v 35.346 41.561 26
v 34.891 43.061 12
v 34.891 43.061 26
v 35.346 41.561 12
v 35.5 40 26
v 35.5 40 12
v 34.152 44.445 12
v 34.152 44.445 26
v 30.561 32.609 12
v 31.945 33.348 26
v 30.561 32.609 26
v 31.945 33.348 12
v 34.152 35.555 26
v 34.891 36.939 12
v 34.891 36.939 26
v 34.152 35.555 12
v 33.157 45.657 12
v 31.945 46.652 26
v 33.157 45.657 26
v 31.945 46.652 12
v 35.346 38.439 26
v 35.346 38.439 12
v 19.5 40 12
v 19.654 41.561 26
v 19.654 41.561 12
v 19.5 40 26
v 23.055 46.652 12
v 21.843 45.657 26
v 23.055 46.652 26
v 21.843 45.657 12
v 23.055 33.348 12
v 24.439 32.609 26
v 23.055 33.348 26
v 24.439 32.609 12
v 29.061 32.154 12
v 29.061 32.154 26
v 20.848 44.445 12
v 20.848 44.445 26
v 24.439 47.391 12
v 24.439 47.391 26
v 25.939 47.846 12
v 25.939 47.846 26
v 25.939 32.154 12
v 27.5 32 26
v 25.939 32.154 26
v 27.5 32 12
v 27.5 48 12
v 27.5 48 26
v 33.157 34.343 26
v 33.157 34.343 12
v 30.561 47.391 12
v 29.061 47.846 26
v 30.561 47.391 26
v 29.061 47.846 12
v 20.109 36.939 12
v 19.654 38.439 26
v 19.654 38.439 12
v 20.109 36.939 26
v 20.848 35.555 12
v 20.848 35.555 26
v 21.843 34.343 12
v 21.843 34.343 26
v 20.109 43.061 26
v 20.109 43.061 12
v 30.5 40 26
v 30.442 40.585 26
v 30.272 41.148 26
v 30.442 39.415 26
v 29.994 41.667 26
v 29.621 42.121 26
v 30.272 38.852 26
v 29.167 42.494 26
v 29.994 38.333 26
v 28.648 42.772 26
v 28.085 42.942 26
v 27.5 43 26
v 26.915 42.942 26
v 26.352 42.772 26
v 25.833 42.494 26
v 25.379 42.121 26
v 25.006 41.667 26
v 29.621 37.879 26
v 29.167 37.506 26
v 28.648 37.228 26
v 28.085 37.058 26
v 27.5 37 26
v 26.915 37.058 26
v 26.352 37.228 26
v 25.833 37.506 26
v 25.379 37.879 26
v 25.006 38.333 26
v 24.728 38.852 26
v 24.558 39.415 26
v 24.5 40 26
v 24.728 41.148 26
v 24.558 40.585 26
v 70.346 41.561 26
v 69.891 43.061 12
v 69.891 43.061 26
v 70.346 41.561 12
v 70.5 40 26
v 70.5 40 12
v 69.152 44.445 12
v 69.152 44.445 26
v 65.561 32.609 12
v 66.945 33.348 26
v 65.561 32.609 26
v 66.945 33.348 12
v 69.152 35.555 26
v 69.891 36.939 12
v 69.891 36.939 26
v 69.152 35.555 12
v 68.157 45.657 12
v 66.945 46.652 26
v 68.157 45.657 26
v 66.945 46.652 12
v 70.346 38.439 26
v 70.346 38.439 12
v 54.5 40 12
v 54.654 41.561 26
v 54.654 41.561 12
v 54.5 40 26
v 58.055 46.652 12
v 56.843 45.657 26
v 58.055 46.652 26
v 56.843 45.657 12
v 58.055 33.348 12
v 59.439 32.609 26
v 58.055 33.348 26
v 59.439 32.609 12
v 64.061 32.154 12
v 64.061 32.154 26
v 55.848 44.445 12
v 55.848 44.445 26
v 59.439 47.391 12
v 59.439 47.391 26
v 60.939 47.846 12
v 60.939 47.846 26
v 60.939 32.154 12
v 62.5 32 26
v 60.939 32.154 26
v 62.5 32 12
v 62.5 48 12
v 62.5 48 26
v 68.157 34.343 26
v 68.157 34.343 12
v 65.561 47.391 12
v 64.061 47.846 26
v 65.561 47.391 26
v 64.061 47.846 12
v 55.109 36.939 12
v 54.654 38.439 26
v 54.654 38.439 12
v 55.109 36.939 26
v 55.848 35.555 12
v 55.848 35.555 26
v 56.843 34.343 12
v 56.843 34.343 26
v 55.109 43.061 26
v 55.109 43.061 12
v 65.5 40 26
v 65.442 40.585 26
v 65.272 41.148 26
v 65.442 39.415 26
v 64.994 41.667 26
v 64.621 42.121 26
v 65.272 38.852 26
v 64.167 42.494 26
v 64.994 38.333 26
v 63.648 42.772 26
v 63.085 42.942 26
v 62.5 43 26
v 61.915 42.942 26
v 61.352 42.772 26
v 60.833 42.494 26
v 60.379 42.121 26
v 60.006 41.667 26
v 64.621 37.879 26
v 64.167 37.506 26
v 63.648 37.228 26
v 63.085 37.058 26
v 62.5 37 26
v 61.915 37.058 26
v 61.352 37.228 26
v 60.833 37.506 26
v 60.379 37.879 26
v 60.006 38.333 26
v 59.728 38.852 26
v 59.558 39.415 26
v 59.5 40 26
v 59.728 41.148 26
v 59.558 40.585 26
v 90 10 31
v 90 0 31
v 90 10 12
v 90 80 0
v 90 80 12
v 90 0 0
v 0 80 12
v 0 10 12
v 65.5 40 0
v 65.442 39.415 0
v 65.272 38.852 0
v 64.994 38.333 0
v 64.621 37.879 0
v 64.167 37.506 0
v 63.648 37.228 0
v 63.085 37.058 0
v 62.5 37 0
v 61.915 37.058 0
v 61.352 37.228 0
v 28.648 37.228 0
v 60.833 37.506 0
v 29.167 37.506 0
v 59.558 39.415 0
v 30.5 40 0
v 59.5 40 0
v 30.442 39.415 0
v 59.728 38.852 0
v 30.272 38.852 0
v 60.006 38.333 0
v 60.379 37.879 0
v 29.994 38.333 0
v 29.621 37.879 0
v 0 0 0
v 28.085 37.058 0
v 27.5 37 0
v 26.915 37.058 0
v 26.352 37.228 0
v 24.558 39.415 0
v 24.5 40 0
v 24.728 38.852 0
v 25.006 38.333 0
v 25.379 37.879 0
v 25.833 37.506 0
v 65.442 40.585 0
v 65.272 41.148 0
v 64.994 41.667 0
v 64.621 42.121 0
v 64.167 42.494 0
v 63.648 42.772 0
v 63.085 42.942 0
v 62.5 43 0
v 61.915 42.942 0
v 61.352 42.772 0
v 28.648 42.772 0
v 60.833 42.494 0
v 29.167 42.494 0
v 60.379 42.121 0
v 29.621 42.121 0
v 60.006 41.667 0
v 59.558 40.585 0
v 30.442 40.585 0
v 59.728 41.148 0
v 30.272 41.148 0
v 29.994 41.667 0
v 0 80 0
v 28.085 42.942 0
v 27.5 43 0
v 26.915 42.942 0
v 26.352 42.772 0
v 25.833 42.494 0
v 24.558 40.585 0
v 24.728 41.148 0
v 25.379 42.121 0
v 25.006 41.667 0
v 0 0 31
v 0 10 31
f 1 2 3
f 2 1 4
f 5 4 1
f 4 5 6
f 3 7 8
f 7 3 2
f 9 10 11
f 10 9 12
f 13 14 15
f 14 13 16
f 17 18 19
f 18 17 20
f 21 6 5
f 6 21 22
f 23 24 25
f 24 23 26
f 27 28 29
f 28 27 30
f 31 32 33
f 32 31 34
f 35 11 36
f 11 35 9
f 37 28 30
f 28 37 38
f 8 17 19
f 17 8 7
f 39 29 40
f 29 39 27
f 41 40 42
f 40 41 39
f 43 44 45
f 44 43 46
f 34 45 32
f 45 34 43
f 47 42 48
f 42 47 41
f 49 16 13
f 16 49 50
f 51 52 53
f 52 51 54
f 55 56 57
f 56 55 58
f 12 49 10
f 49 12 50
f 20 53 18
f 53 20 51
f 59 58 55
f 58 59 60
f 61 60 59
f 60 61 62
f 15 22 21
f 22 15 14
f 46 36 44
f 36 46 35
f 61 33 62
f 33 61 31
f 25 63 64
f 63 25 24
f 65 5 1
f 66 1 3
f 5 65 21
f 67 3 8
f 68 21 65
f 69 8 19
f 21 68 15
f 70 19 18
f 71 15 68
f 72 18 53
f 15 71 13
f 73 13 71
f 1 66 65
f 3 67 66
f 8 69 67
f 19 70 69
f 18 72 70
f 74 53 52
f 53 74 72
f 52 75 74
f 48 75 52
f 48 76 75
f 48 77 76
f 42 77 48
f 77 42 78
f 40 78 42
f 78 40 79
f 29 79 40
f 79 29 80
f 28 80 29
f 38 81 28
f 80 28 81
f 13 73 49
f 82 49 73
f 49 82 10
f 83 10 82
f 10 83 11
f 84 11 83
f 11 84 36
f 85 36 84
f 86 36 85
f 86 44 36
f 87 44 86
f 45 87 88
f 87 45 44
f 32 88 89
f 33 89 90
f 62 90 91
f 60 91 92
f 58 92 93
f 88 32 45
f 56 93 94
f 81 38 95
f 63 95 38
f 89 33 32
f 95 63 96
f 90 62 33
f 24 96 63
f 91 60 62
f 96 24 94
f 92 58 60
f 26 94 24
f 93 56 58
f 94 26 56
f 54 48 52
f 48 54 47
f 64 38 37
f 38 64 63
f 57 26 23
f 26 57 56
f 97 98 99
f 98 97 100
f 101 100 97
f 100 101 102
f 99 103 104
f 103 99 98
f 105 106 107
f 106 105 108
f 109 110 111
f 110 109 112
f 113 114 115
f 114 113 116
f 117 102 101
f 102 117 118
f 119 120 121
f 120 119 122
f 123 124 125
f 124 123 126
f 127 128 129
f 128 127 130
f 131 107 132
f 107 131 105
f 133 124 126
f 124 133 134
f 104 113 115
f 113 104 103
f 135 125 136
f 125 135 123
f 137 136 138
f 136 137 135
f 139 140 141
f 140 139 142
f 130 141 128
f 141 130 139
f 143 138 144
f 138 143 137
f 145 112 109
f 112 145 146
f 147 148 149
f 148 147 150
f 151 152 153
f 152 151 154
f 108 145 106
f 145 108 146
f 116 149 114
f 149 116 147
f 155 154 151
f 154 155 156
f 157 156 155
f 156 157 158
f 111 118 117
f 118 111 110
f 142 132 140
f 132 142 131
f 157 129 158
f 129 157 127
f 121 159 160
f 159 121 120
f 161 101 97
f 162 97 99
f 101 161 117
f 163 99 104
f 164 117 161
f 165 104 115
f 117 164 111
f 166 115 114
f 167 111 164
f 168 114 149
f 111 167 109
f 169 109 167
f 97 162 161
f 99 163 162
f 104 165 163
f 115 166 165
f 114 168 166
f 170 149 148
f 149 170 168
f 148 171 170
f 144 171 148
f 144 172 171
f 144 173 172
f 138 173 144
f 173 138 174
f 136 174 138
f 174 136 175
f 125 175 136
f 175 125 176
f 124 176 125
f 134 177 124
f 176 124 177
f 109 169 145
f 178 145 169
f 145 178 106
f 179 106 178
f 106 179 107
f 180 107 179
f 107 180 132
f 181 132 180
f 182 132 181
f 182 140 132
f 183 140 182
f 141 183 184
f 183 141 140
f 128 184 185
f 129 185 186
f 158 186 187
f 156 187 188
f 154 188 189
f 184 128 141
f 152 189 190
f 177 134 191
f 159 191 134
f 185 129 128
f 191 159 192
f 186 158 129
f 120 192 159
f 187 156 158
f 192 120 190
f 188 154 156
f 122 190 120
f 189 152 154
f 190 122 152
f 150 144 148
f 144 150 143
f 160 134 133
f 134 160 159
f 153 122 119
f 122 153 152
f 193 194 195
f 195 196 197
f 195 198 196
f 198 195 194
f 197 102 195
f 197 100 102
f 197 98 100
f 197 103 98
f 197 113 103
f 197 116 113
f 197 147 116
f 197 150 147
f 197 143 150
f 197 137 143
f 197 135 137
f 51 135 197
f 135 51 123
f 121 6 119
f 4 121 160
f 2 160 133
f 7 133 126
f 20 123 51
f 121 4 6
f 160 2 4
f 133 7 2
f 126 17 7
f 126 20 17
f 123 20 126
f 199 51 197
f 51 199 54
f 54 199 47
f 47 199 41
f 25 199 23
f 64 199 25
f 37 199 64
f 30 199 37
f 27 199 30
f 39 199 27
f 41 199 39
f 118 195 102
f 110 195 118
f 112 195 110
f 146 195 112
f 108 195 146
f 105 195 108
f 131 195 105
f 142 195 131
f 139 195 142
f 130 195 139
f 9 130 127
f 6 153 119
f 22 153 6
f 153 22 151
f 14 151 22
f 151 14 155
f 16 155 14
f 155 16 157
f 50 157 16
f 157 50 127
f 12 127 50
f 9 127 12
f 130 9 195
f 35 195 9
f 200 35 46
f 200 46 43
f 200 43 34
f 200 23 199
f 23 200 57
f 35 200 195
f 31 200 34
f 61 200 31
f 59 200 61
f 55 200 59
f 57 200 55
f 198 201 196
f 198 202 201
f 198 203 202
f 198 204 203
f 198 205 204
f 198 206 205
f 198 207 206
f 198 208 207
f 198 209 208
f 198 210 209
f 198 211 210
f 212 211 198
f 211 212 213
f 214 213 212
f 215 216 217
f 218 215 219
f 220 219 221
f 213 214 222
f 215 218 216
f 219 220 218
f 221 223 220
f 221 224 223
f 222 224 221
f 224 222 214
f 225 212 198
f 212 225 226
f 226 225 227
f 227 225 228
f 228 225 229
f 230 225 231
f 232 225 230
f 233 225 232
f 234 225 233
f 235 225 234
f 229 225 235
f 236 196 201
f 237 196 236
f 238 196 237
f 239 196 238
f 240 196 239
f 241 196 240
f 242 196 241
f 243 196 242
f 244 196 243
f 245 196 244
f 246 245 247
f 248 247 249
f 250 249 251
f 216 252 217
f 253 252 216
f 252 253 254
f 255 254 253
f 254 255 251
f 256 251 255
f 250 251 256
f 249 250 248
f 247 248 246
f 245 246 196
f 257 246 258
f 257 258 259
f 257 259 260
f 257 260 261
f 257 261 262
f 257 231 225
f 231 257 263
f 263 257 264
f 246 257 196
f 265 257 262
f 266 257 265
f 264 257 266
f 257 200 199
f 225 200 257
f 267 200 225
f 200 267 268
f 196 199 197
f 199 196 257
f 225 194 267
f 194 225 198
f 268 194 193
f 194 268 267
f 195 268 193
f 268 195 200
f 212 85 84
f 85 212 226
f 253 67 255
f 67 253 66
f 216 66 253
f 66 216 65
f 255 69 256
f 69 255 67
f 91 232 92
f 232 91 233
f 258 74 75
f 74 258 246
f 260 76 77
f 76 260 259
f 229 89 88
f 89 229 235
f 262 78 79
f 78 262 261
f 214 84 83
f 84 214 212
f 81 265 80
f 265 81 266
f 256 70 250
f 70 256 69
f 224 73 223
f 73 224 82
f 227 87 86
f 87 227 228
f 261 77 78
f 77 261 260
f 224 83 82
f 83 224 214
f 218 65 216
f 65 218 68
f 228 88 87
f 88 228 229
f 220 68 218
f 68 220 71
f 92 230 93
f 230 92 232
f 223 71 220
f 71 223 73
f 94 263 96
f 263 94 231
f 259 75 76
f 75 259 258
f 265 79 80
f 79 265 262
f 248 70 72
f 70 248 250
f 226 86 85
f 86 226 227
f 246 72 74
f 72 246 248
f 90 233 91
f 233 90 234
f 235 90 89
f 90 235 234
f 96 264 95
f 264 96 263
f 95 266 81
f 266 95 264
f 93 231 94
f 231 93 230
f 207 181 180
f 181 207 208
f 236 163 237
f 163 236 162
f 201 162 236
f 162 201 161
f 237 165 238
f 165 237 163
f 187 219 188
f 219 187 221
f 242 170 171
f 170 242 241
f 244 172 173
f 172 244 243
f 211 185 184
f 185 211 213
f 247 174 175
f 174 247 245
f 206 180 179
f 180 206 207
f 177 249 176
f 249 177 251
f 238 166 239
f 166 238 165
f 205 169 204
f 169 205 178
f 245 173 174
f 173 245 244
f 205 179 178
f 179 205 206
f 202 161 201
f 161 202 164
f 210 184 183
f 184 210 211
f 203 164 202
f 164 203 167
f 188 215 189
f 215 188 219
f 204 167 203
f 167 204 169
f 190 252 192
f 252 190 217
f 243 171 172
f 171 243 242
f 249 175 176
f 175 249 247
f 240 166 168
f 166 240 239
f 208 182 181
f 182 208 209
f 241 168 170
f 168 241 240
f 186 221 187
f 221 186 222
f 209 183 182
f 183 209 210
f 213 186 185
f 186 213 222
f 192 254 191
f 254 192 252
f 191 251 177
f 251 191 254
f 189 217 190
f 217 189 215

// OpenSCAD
$fn = 32;

// ----------------------------------------------------------------------
// Drill jig: fence jig
// ----------------------------------------------------------------------

// --- parameters (mm) ---
plate_l = 90;             // plate length, X
plate_w = 80;             // plate width, Y
plate_t = 12;             // plate thickness
boss_d = 16;              // guide boss diameter
boss_h = 15;              // boss height above the plate
guide_d = 6;              // guide hole diameter
boss_pitch = 35;          // boss pitch
fence_h = 20;             // fence height above the plate
fence_t = 10;             // fence thickness

n_boss = 2;  // guide bosses
boss_x0 = (plate_l - (n_boss - 1) * boss_pitch) / 2;  // first boss X
boss_top = plate_t - 1 + boss_h;  // boss crown height
fence_top = plate_t - 1 + fence_h;  // fence crown height
total_h = max([fence_top, boss_top]);  // overall height

difference() {
  union() {
  cube([plate_l, plate_w, plate_t]);
  for (i = [0 : n_boss - 1])
    translate([boss_x0 + i * boss_pitch, plate_w / 2, plate_t - 1])
      cylinder(h = boss_h, d = boss_d);
  translate([0, 0, plate_t - 1]) cube([plate_l, fence_t, fence_h]);
  }
  for (i = [0 : n_boss - 1])
    translate([boss_x0 + i * boss_pitch, plate_w / 2, -1])
      cylinder(h = plate_t + boss_h, d = guide_d);
}
